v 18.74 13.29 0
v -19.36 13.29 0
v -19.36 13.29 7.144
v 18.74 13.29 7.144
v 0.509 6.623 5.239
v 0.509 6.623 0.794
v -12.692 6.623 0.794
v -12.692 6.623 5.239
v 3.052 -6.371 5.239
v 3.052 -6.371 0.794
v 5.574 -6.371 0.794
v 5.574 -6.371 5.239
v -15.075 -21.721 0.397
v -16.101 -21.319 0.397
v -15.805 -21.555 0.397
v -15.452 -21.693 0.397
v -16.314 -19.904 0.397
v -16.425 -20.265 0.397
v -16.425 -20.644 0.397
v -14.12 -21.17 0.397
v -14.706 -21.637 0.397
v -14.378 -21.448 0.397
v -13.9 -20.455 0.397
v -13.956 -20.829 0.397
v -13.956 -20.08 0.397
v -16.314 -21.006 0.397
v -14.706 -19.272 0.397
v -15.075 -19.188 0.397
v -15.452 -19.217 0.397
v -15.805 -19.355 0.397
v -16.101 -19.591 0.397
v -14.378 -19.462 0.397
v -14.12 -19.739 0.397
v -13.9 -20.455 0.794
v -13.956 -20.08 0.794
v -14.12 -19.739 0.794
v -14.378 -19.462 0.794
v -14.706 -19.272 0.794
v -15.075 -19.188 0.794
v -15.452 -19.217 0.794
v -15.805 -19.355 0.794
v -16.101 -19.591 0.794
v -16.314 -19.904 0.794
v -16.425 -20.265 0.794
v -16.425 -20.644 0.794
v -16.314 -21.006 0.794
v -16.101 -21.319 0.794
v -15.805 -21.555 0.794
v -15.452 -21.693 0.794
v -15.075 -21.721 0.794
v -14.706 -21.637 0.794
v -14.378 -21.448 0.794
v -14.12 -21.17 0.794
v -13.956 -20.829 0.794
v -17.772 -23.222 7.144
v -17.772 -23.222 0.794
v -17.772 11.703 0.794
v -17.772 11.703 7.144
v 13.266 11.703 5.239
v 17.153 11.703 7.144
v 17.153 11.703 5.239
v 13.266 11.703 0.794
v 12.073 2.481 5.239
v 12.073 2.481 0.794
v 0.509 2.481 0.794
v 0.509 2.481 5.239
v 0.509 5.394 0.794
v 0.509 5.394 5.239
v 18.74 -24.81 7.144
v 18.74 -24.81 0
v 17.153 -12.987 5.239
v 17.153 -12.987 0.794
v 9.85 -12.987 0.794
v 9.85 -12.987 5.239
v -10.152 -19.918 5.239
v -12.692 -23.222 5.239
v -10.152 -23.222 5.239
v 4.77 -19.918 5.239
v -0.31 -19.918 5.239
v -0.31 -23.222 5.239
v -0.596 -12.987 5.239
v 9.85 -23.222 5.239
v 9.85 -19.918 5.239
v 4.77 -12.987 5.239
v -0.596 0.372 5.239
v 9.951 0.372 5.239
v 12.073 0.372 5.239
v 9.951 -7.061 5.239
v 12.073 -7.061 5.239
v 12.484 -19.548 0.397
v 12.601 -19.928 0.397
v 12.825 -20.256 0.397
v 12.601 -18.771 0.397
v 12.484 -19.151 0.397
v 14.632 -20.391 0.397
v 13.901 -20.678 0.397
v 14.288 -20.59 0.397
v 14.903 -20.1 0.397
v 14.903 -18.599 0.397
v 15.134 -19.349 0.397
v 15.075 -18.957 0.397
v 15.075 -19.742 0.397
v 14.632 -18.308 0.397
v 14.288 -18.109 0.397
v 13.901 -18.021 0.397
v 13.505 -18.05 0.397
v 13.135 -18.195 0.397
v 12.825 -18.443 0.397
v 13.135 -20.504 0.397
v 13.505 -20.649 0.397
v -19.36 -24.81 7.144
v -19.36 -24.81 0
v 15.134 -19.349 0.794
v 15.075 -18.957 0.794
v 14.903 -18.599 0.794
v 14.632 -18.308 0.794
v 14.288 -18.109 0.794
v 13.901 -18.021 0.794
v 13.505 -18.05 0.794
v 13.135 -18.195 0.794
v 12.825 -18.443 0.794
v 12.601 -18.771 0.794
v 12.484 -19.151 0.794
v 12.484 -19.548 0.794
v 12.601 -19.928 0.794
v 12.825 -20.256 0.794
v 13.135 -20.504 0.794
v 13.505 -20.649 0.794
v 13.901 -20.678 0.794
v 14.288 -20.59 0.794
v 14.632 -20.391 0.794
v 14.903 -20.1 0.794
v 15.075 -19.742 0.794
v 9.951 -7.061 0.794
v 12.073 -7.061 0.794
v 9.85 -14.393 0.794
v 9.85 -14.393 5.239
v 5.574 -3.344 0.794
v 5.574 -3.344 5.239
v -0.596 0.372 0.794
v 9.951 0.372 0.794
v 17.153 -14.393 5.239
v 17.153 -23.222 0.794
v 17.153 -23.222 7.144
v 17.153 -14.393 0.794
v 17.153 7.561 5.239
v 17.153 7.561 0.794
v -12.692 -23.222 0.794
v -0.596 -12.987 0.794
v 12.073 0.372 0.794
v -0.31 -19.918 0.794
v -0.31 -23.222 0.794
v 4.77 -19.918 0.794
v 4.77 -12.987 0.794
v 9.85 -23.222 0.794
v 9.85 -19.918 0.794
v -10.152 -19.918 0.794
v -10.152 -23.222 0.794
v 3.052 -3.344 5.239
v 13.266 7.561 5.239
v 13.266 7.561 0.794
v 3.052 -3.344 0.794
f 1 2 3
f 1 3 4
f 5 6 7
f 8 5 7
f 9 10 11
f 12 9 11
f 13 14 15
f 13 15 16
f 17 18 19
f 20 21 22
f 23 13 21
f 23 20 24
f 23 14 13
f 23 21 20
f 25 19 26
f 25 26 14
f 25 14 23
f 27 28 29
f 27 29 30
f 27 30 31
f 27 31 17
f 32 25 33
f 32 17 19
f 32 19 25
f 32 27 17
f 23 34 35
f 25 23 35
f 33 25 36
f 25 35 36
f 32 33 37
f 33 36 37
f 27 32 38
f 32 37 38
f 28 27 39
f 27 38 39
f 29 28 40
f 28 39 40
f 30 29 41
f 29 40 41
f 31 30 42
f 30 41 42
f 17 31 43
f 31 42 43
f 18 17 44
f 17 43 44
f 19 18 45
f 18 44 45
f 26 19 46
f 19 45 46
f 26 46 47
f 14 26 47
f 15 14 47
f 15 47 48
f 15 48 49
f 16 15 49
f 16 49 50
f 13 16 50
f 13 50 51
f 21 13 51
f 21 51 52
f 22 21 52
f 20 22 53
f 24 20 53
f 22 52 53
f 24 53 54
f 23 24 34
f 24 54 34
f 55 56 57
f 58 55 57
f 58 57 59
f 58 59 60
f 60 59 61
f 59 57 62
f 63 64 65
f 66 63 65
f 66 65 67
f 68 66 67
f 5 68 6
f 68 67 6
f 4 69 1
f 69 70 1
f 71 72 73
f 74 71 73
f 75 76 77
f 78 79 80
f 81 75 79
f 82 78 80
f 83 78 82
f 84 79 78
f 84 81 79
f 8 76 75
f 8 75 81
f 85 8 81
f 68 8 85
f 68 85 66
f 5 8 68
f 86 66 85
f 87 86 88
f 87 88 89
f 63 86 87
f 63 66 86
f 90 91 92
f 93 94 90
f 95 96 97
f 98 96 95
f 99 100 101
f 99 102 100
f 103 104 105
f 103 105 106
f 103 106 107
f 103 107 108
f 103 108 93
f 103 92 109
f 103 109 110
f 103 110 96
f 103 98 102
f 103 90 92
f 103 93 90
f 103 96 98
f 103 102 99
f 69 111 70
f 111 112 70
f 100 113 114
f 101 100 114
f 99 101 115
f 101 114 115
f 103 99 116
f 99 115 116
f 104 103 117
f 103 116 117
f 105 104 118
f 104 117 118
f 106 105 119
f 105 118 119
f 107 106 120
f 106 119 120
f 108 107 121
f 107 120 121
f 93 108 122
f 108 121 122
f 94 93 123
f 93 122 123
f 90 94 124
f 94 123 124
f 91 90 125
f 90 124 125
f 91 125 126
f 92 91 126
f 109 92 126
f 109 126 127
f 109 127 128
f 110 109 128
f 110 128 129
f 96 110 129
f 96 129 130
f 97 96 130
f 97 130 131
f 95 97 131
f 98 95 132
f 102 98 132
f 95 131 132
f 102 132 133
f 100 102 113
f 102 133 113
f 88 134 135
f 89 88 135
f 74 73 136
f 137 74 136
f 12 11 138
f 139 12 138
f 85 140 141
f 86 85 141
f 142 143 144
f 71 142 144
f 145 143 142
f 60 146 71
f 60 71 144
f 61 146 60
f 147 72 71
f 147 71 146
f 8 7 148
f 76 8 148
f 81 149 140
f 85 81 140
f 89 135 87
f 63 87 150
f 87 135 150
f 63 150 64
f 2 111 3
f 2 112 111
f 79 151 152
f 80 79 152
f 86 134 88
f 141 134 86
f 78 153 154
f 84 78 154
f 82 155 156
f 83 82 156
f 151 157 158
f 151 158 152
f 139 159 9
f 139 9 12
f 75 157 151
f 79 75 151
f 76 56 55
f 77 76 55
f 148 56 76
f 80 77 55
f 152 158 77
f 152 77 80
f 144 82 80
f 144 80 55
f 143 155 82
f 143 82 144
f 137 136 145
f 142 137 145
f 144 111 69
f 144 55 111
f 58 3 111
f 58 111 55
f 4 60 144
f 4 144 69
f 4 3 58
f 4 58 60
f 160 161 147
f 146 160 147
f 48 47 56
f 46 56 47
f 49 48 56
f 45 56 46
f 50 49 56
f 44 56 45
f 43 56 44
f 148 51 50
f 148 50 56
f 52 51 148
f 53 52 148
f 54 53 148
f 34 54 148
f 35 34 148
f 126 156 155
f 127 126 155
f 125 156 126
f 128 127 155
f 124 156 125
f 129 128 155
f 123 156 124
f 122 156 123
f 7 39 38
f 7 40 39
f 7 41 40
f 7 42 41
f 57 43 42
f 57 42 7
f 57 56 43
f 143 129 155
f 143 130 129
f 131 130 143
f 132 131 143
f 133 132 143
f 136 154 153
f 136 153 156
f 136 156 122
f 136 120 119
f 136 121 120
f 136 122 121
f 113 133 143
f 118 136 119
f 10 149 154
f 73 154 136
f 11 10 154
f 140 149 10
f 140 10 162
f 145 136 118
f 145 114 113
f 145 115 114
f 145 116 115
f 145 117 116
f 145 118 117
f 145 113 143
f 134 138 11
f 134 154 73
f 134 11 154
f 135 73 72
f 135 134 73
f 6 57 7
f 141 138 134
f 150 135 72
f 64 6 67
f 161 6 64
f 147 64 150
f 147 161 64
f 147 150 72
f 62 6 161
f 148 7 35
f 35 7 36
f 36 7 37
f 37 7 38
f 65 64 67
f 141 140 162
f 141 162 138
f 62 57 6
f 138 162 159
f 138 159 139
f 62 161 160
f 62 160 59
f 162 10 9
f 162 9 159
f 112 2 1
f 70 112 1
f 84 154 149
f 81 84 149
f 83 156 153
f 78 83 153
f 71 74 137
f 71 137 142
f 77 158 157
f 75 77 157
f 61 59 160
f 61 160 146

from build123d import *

# Parameters (mm, degrees)
F0_W     = 38.1
F0_H     = 38.1
F1_DEPTH = 0.79375
F2_W     = 38.1
F2_H     = 38.1
F2_W_2   = 34.925
F2_H_2   = 34.925
F3_DEPTH = 6.35
F4_W     = 1.1048951419
F4_H     = 2.9129034374
F4_W_2   = 5.5244707037
F4_H_2   = 2.109343739
F4_W_3   = 2.1220554633
F4_H_3   = 7.4329261261
F4_W_4   = 3.8873708525
F4_H_4   = 4.1415788532
F4_W_5   = 2.5213125627
F4_H_5   = 3.0267448165
F5_DEPTH = 4.445
F6_R     = 1.3326175267
F6_R_2   = 1.27
F7_DEPTH = 0.396875


with BuildPart() as f1:
    # F0 (on Top) → F1 (new body)
    with BuildSketch(Plane.XY):
        with Locations((-0.3095176071, -5.7596102857)):
            Rectangle(F0_W, F0_H)
    extrude(amount=F1_DEPTH)

    # F2 (on face) → F3 (join)
    with BuildSketch(Plane.XY.offset(0.79375)):
        with Locations((-0.3095176071, -5.7596102857)):
            Rectangle(F2_W, F2_H)
        with Locations((-0.3095176071, -5.7596102857)):
            Rectangle(F2_W_2, F2_H_2, mode=Mode.SUBTRACT)
    extrude(amount=F3_DEPTH)

    # F4 (on face) → F5 (join)
    with BuildSketch(Plane.XY.offset(0.79375)):
        Polygon((-12.6920176071, 6.6228897143), (-12.6920176071, -23.2221102857), (-10.1520176071, -23.2221102857), (-10.1520176071, -19.9179127812), (-10.1520176071, -12.9872104153), (-10.1520176071, 0.3719671222), (-10.1520176071, 5.3942142986), (-10.1520176071, 6.6228897143), align=None)
        Polygon((0.5091035802, 6.6228897143), (-10.1520176071, 6.6228897143), (-10.1520176071, 5.3942142986), (-0.5957915617, 5.3942142986), (0.5091035802, 5.3942142986), align=None)
        Polygon((-10.1520176071, -12.9872104153), (-10.1520176071, -19.9179127812), (-0.3095176071, -19.9179127812), (4.7704823929, -19.9179127812), (4.7704823929, -12.9872104153), (-0.5957915617, -12.9872104153), align=None)
        Polygon((-0.5957915617, 5.3942142986), (-10.1520176071, 5.3942142986), (-10.1520176071, 0.3719671222), (-10.1520176071, -12.9872104153), (-0.5957915617, -12.9872104153), (-0.5957915617, 0.3719671222), (-0.5957915617, 2.4813108612), align=None)
        Polygon((4.7704823929, -19.9179127812), (-0.3095176071, -19.9179127812), (-0.3095176071, -23.2221102857), (9.8504823929, -23.2221102857), (9.8504823929, -19.9179127812), align=None)
        with Locations((-0.0433439907, 3.9377625799)):
            Rectangle(F4_W, F4_H)
        Polygon((0.5091035802, 2.4813108612), (-0.5957915617, 2.4813108612), (-0.5957915617, 0.3719671222), (4.3260116892, 0.3719671222), (4.3260116892, 2.4813108612), (0.9108832403, 2.4813108612), align=None)
        with Locations((7.0882470411, 1.4266389917)):
            Rectangle(F4_W_2, F4_H_2)
        Polygon((9.8504823929, 2.4813108612), (9.8504823929, 0.3719671222), (9.9509269296, 0.3719671222), (12.0729823929, 0.3719671222), (12.0729823929, 2.4813108612), align=None)
        with Locations((11.0119546612, -3.3444959408)):
            Rectangle(F4_W_3, F4_H_3)
        Polygon((17.1529823929, -14.3934395164), (17.1529823929, -12.9872104153), (12.3616074508, -12.9872104153), (9.8504823929, -12.9872104153), (9.8504823929, -14.3934395164), align=None)
        with Locations((15.2092969666, 9.6321002878)):
            Rectangle(F4_W_4, F4_H_4)
        with Locations((4.3130695121, -4.8578686547)):
            Rectangle(F4_W_5, F4_H_5)
    extrude(amount=F5_DEPTH)

    # F6 (on face) → F7 (cut)
    with BuildSketch(Plane.XY.offset(0.79375)):
        with Locations((13.801550063, -19.3494927589)):
            Circle(F6_R)
        with Locations((-15.1696396893, -20.454704795)):
            Circle(F6_R_2)
    extrude(amount=-F7_DEPTH, mode=Mode.SUBTRACT)


solid = f1.part
